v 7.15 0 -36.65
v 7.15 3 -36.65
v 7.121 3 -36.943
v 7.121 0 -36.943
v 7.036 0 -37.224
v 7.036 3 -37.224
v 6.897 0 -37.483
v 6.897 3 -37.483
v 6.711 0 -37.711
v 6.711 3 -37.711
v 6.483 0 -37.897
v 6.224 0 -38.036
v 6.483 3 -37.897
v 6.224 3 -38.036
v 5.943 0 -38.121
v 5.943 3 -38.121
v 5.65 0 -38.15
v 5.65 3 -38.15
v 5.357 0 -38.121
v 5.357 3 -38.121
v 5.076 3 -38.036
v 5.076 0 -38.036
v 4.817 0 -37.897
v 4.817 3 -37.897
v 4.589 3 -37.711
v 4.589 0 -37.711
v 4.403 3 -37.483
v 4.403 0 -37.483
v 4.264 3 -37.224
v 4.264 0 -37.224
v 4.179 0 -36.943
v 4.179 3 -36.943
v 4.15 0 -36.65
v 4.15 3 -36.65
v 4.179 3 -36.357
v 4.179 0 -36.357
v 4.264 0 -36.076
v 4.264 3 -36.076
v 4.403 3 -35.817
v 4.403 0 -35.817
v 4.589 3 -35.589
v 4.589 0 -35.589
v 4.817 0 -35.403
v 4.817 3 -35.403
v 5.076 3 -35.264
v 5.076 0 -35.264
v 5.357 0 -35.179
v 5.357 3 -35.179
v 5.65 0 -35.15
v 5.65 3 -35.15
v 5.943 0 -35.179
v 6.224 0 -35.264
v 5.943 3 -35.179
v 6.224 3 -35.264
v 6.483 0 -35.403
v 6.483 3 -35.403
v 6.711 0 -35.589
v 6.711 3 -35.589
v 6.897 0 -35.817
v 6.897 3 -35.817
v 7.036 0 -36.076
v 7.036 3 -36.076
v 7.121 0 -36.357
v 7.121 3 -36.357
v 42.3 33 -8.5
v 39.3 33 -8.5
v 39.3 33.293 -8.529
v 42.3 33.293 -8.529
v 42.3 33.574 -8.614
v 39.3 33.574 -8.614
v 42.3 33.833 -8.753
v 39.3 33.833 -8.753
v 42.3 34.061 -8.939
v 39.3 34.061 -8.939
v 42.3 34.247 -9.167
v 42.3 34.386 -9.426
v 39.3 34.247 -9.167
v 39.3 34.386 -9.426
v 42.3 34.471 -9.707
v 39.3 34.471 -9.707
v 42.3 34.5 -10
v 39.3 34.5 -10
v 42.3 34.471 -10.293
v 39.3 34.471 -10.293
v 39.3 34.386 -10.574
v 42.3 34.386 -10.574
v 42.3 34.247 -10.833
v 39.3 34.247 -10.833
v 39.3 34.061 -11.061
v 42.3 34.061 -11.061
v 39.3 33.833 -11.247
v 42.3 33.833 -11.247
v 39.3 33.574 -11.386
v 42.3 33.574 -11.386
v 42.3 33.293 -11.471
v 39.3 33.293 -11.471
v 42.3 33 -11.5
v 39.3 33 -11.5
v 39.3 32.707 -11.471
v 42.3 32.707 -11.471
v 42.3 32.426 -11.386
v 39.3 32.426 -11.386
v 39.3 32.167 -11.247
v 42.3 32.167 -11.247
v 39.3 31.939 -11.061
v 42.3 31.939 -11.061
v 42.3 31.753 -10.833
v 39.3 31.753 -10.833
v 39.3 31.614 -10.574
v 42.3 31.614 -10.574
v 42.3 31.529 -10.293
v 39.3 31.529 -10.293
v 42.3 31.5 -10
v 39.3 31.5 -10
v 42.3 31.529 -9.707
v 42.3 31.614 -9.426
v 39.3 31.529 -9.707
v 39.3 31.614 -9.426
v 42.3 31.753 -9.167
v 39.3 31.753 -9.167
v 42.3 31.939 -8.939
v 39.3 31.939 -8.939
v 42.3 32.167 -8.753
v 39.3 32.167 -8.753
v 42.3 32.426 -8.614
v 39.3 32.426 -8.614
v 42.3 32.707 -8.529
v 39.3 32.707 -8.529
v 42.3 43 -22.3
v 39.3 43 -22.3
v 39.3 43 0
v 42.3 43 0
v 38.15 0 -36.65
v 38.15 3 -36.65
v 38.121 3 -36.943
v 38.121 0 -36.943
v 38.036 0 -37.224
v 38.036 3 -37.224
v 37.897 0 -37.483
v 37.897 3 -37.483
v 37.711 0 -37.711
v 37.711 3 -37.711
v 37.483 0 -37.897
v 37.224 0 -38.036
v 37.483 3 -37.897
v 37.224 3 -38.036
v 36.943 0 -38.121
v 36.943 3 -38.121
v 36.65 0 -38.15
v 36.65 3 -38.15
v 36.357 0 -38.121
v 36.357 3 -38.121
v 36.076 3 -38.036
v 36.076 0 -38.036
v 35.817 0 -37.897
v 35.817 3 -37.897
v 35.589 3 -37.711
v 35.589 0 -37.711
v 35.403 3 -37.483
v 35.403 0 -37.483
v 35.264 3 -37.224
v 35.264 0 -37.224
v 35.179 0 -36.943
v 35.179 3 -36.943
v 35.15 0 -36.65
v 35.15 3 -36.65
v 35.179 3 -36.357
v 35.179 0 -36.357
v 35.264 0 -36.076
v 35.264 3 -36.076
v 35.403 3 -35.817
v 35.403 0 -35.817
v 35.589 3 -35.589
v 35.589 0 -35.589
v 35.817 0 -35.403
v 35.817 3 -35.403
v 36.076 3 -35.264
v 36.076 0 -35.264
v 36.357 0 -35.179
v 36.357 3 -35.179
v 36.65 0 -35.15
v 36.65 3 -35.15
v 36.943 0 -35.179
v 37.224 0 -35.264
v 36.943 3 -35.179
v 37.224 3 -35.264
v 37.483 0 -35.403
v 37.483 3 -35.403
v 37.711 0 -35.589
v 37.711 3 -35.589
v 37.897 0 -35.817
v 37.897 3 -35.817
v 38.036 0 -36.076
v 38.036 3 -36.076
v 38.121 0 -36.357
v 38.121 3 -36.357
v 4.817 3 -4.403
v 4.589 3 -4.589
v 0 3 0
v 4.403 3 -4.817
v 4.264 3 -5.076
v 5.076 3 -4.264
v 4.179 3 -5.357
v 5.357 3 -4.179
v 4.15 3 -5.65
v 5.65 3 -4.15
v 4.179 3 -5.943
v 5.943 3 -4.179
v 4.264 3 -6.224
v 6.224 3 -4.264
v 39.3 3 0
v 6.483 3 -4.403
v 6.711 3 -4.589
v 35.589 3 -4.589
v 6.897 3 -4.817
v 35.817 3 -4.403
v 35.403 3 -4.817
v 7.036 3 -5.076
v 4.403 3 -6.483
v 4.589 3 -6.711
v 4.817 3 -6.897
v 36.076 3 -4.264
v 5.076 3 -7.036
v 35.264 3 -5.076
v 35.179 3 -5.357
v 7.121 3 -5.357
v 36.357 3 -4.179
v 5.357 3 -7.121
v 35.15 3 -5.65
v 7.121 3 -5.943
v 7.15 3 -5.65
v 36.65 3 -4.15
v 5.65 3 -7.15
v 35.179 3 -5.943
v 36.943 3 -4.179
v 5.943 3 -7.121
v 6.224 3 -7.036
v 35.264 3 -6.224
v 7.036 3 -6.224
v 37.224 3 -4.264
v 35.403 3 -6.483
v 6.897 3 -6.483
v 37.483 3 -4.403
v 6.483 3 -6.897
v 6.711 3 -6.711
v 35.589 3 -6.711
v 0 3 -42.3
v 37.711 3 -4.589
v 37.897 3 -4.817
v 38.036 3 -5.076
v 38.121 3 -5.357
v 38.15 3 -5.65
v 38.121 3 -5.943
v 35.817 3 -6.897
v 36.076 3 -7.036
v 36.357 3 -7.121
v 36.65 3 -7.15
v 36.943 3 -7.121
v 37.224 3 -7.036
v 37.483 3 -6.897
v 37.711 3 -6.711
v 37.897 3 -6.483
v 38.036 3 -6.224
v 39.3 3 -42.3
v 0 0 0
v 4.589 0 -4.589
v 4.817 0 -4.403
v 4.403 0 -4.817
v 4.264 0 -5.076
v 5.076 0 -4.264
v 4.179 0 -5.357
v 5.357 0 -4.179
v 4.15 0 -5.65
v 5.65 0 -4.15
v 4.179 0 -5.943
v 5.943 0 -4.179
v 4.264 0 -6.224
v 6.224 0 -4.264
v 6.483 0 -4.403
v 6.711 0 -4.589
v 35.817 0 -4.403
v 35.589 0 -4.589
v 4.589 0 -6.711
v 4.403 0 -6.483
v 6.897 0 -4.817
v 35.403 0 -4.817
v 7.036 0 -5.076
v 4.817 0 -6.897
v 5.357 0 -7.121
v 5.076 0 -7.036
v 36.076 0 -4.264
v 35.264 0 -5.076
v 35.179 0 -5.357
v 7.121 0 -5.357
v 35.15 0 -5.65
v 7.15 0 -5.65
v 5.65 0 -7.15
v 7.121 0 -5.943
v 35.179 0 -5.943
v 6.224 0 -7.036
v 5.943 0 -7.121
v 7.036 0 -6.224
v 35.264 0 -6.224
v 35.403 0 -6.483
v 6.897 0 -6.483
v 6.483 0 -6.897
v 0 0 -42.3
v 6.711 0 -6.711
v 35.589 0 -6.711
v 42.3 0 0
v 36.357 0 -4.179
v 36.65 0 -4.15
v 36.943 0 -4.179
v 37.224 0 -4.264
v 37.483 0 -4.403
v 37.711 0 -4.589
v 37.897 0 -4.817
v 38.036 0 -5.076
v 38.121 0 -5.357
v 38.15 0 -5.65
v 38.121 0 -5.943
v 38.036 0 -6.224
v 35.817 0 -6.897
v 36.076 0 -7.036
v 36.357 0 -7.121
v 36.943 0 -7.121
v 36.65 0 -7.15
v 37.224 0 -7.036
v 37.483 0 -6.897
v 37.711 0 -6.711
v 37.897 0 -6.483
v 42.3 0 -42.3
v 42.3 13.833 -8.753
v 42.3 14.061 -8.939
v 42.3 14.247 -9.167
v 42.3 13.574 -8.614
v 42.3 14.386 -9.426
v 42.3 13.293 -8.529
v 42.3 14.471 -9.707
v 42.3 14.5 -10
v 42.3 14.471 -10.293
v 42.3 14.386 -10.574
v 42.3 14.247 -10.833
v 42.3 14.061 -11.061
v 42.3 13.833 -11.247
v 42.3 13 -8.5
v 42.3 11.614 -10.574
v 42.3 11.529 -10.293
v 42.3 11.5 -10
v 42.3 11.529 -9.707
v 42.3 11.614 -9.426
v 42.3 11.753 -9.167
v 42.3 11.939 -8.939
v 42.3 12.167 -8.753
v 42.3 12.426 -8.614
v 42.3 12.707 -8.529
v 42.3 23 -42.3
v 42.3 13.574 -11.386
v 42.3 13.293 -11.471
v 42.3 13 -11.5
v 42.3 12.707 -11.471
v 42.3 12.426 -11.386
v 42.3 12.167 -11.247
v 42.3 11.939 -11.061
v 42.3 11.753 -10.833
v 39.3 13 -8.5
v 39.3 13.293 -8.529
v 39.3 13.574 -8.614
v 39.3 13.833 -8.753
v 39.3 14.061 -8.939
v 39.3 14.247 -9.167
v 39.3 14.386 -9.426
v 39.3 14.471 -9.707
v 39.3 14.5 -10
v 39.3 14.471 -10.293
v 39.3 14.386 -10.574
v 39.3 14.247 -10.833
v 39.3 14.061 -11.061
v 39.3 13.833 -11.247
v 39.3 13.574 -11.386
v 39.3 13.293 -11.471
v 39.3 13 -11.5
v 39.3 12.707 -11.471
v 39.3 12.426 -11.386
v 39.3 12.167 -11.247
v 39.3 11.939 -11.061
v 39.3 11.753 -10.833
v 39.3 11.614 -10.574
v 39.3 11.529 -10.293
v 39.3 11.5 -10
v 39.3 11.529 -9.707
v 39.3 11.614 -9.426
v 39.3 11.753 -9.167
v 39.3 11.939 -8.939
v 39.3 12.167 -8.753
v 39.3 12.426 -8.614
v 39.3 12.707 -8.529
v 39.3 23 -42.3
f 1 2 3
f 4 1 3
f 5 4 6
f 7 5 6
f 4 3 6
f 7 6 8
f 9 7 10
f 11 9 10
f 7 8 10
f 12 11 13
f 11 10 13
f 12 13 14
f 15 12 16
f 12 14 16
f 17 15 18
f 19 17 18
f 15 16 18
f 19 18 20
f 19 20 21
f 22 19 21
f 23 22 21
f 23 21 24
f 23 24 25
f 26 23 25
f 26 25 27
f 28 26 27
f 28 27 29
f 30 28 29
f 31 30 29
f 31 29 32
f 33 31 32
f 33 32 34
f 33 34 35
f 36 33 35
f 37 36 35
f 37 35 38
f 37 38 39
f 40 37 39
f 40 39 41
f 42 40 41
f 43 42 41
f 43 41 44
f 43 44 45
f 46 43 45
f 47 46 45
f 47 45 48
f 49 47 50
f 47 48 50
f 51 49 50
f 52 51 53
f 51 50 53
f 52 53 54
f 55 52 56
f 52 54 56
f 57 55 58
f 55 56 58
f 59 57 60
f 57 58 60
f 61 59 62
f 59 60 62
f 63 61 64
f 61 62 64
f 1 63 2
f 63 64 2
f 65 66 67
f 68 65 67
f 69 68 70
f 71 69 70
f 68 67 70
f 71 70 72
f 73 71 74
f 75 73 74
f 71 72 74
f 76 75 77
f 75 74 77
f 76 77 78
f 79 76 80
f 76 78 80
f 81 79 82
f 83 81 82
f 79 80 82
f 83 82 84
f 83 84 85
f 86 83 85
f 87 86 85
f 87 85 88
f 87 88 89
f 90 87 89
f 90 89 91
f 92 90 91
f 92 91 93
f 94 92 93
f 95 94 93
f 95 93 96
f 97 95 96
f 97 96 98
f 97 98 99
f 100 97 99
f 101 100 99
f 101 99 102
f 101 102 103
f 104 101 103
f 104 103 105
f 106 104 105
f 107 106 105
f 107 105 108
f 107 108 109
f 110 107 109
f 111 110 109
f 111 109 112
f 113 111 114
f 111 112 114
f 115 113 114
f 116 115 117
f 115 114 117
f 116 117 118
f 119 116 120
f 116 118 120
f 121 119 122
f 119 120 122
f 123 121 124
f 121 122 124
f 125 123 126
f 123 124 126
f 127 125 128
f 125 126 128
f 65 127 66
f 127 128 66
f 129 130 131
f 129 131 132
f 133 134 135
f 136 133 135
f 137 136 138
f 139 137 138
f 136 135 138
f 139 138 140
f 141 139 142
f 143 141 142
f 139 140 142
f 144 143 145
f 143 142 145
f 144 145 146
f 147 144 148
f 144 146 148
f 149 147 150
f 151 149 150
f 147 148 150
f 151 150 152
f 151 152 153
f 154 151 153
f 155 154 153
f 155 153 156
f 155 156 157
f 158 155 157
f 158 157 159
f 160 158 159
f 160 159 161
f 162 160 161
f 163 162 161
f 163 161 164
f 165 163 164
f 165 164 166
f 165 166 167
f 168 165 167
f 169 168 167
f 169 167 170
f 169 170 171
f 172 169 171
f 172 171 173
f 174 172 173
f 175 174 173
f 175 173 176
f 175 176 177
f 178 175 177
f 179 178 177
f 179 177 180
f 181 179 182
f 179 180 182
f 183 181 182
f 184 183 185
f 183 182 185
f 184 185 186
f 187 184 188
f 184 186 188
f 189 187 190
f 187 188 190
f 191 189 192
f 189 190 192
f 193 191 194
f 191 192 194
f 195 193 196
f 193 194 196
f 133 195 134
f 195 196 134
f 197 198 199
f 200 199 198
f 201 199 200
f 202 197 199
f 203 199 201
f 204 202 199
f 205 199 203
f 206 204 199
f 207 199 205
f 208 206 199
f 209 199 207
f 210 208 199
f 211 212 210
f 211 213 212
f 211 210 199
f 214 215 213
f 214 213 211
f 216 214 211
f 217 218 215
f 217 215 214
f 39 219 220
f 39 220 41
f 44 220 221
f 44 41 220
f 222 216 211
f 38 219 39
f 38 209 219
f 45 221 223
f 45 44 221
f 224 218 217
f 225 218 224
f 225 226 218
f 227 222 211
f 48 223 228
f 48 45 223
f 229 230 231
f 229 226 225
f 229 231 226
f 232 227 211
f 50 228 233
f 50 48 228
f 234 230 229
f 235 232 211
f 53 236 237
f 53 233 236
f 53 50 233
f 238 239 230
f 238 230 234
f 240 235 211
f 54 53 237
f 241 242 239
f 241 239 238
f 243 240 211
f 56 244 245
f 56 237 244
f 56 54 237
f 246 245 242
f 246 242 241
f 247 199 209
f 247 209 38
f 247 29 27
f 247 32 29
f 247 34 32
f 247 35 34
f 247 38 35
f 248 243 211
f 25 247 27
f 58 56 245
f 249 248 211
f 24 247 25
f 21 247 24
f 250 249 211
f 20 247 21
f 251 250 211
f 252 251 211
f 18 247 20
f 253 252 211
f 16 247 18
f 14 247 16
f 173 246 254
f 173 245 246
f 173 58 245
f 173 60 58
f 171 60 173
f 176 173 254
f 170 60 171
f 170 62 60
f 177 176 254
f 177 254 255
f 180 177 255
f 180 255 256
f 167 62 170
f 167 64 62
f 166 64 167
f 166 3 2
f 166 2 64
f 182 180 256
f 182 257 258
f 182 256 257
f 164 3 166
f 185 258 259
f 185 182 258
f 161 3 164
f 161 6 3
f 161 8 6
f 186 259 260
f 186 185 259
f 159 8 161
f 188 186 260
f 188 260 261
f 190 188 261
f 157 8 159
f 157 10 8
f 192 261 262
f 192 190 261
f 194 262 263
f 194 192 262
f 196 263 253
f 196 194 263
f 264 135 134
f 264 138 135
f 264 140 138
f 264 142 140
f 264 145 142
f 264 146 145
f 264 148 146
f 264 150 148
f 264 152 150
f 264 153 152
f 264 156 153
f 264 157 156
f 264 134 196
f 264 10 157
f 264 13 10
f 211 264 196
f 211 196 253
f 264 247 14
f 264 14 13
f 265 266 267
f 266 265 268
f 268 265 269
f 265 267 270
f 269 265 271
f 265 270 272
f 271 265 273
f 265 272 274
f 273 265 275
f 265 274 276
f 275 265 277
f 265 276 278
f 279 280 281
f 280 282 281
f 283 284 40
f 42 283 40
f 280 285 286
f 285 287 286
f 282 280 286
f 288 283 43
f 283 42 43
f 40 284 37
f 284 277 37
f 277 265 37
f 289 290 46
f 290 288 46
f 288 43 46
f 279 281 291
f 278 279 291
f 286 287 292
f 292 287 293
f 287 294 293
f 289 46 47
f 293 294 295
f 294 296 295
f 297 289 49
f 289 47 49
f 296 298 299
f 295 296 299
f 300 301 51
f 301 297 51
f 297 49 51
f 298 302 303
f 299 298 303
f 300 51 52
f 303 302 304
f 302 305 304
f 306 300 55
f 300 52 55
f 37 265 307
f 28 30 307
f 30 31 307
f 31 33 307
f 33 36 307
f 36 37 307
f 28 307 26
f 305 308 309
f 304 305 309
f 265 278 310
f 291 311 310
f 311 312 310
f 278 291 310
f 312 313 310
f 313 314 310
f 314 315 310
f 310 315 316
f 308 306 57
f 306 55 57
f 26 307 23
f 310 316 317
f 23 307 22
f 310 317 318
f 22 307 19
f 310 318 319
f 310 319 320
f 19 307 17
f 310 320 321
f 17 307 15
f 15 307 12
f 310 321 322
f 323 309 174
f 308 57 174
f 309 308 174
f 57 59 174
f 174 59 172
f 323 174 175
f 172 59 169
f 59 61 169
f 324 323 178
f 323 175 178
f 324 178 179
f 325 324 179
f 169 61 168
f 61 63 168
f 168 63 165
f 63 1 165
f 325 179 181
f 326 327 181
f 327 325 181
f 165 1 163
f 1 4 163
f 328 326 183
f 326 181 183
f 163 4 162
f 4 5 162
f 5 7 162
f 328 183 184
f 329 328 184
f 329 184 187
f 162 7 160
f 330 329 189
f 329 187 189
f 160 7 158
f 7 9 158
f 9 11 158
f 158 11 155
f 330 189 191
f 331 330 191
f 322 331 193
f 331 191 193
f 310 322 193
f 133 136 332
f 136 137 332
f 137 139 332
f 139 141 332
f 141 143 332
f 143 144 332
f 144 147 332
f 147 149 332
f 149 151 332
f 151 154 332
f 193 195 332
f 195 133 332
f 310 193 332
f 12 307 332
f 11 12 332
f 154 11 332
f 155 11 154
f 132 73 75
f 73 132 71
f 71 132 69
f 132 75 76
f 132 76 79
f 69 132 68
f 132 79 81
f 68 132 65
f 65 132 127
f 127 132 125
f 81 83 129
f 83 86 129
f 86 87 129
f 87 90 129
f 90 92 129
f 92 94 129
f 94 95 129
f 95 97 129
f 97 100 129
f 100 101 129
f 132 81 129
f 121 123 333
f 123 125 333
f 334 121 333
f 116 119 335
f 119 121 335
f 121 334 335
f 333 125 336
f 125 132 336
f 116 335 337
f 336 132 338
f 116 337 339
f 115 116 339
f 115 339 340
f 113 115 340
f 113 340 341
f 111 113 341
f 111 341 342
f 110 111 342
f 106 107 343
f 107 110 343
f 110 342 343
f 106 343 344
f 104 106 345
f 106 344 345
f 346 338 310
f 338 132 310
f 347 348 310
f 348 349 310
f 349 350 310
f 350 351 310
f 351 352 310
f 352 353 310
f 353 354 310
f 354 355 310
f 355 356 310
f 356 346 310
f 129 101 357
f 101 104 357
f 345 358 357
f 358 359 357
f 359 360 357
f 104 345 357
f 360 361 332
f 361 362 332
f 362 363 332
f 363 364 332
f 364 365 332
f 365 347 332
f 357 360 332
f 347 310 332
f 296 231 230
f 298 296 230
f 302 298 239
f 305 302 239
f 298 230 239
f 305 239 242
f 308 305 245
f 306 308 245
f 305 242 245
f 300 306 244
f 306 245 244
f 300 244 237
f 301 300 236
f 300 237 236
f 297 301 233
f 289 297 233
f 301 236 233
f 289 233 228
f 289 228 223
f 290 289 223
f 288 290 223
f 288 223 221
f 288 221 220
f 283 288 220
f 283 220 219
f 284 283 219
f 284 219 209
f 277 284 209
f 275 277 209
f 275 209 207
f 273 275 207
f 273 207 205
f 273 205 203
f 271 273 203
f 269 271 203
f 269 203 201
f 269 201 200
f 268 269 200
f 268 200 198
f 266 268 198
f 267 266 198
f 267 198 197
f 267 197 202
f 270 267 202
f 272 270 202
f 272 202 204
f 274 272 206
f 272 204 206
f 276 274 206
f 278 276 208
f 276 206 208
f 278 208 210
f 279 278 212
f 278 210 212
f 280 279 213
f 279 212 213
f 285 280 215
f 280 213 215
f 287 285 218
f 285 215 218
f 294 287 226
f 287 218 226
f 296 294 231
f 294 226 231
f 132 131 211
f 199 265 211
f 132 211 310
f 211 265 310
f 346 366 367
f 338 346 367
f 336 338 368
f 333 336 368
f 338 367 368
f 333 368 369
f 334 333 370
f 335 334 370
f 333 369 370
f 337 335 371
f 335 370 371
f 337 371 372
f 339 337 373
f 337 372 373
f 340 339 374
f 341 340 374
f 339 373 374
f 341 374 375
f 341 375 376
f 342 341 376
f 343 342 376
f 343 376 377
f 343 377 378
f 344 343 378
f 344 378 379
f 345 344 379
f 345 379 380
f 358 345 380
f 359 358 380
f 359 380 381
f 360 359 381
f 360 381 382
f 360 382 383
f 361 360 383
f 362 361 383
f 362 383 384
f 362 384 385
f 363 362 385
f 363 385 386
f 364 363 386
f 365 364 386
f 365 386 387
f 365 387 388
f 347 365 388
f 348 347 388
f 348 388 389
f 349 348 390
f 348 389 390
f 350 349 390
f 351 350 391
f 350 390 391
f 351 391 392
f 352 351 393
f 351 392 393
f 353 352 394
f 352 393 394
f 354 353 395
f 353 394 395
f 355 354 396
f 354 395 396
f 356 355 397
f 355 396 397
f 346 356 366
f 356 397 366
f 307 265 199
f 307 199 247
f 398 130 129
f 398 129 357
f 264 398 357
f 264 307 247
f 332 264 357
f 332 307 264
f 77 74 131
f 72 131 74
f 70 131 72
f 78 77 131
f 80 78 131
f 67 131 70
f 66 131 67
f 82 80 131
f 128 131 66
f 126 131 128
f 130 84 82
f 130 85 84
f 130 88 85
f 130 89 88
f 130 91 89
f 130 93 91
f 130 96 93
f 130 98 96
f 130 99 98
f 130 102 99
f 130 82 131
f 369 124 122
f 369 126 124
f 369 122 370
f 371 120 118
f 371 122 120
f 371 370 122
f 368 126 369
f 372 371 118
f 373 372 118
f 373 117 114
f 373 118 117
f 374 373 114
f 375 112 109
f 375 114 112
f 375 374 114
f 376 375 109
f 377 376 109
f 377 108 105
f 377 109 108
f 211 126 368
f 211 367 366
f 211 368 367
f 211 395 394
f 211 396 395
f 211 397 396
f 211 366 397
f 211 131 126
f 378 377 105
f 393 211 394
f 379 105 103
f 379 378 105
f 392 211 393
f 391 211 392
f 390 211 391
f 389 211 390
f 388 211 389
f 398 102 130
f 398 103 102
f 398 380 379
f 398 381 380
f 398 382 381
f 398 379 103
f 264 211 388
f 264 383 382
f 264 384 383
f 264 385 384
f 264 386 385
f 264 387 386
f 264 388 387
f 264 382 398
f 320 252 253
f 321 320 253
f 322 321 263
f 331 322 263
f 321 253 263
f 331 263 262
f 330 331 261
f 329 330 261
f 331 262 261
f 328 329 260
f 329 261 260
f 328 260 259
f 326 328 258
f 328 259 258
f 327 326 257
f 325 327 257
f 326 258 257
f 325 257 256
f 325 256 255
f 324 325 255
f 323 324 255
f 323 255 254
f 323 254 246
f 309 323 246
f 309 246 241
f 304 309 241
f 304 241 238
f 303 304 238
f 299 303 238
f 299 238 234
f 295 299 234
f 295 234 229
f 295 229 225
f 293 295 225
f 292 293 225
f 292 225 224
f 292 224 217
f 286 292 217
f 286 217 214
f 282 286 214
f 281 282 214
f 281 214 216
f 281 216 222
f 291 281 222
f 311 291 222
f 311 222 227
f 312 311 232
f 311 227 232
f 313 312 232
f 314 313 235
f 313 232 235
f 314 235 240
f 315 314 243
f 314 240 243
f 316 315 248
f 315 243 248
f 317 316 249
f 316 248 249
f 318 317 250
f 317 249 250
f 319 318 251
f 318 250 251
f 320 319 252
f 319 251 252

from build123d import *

# Parameters (mm, degrees)
SKETCH1_W           = 42.3
SKETCH1_H           = 42.3
BOSS_EXTRUDE1_DEPTH = 3
SKETCH2_R           = 1.5
CUT_EXTRUDE1_DEPTH  = 4
SKETCH5_W           = 3
SKETCH5_H           = 42.3
BOSS_EXTRUDE2_DEPTH = 40
CUT_EXTRUDE2_DEPTH  = 40
SKETCH7_R           = 1.5
CUT_EXTRUDE3_DEPTH  = 4


with BuildPart() as part:
    # Sketch1 → Boss-Extrude1 (new body)
    with BuildSketch(Plane(origin=(0, 0, 0), x_dir=(1, 0, 0), z_dir=(0, 1, 0))):
        with Locations((21.15, 21.15)):
            Rectangle(SKETCH1_W, SKETCH1_H)
    extrude(amount=BOSS_EXTRUDE1_DEPTH)

    # Sketch2 → Cut-Extrude1 (cut, through all)
    with BuildSketch(Plane(origin=(0, 3, 0), x_dir=(1, 0, 0), z_dir=(0, 1, 0))):
        with Locations((5.65, 5.65)):
            Circle(SKETCH2_R)
        with Locations((36.65, 5.65)):
            Circle(SKETCH2_R)
        with Locations((36.65, 36.65)):
            Circle(SKETCH2_R)
        with Locations((5.65, 36.65)):
            Circle(SKETCH2_R)
    extrude(amount=-CUT_EXTRUDE1_DEPTH, mode=Mode.SUBTRACT)

    # Sketch5 → Boss-Extrude2 (add)
    with BuildSketch(Plane(origin=(0, 3, 0), x_dir=(1, 0, 0), z_dir=(0, 1, 0))):
        with Locations((40.8, 21.15)):
            Rectangle(SKETCH5_W, SKETCH5_H)
    extrude(amount=BOSS_EXTRUDE2_DEPTH)

    # Sketch6 → Cut-Extrude2 (cut)
    with BuildSketch(Plane.ZY.offset(-39.3)):
        Polygon((-42.3, 43), (-22.3, 43), (-42.3, 23), align=None)
    extrude(amount=-CUT_EXTRUDE2_DEPTH, mode=Mode.SUBTRACT)

    # Sketch7 → Cut-Extrude3 (cut, through all)
    with BuildSketch(Plane.ZY.offset(-39.3)):
        with Locations((-10, 33)):
            Circle(SKETCH7_R)
        with Locations((-10, 13)):
            Circle(SKETCH7_R)
    extrude(amount=-CUT_EXTRUDE3_DEPTH, mode=Mode.SUBTRACT)


solid = part.part
